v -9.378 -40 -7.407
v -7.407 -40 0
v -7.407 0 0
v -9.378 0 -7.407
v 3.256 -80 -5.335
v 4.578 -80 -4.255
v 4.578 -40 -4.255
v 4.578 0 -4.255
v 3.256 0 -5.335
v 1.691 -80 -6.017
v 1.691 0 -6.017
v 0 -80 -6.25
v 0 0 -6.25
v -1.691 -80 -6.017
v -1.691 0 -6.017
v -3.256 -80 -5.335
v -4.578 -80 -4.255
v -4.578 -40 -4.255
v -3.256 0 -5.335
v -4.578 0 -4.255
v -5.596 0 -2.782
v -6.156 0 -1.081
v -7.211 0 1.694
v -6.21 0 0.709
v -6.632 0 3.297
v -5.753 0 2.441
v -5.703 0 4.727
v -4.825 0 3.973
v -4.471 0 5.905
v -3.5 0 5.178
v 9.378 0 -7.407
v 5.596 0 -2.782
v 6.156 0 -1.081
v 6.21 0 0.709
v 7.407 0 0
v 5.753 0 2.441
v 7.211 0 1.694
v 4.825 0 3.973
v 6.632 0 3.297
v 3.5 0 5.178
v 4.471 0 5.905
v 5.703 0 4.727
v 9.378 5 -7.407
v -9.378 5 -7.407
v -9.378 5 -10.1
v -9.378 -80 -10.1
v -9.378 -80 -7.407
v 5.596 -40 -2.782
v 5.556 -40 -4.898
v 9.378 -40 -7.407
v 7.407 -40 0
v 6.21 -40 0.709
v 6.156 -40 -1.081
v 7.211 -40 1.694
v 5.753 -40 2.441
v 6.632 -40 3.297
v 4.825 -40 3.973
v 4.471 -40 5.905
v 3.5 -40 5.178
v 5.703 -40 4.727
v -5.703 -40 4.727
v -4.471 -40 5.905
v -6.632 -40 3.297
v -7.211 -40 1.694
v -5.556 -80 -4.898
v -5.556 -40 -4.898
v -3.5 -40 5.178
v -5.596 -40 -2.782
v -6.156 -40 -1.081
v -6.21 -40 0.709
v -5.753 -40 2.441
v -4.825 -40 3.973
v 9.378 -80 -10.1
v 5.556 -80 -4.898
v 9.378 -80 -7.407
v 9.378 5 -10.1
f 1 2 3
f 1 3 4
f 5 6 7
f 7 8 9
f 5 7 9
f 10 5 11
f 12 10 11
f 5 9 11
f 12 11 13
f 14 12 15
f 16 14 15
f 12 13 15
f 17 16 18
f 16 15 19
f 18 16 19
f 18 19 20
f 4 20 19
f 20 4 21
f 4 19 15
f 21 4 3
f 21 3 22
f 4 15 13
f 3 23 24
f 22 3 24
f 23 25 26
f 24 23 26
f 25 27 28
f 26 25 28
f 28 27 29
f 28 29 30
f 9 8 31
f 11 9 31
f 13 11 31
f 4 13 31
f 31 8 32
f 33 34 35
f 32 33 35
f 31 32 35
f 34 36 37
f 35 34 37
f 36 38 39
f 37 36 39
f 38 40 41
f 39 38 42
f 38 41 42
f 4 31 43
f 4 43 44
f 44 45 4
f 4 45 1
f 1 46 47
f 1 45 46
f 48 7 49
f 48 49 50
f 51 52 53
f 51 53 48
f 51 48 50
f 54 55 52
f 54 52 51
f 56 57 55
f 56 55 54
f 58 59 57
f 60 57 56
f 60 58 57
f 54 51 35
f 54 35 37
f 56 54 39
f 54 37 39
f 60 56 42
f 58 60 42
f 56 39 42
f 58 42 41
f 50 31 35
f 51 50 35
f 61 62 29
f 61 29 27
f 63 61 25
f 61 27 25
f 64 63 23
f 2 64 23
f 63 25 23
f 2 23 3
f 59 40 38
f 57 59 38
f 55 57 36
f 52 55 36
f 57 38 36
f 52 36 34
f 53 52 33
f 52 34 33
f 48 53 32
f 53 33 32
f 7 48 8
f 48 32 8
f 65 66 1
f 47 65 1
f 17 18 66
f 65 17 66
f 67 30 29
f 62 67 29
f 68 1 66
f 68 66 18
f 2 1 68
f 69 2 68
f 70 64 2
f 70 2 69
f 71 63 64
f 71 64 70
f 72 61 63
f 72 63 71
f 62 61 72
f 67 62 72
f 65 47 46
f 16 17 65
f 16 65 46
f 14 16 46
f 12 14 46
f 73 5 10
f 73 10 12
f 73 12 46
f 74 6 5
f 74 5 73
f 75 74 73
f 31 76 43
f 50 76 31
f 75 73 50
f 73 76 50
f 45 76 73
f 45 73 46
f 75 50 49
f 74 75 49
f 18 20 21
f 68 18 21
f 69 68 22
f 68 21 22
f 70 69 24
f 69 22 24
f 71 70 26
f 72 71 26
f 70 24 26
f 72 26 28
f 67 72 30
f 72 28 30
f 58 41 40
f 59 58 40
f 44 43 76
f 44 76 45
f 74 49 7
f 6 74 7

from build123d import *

# Parameters (mm, degrees)
F0_W     = 9.3780029565
F0_H     = 2.6930641449
F1_DEPTH = 80
F2_DEPTH = 40
F3_W     = 18.756005913
F3_H     = 2.6930641449
F4_DEPTH = 5


with BuildPart() as f1:
    # F0 (on Front) → F1 (new body)
    with BuildSketch(Plane.XZ):
        with BuildLine():
            ThreePointArc((4.5775509482, -4.2554115332), (0, -6.25), (-4.5775509482, -4.2554115332))
            Line((-4.5775509482, -4.2554115332), (-5.5563090648, -4.8979718597))
            ThreePointArc((-5.5563090648, -4.8979718597), (-3.0482564998, -6.7506170883), (0, -7.4069358551))
            ThreePointArc((0, -7.4069358551), (3.0482564998, -6.7506170883), (5.5563090648, -4.8979718597))
            Line((5.5563090648, -4.8979718597), (4.5775509482, -4.2554115332))
        make_face()
        with BuildLine():
            Line((9.3780029565, -7.4069358551), (5.5563090648, -4.8979718597))
            ThreePointArc((5.5563090648, -4.8979718597), (3.0482564998, -6.7506170883), (0, -7.4069358551))
            Line((0, -7.4069358551), (9.3780029565, -7.4069358551))
        make_face()
        with BuildLine():
            ThreePointArc((0, -7.4069358551), (-3.0482564998, -6.7506170883), (-5.5563090648, -4.8979718597))
            Line((-5.5563090648, -4.8979718597), (-9.3780029565, -7.4069358551))
            Line((-9.3780029565, -7.4069358551), (0, -7.4069358551))
        make_face()
        with Locations((-4.6890014783, -8.7534679275)):
            Rectangle(F0_W, F0_H)
        with Locations((4.6890014783, -8.7534679275)):
            Rectangle(F0_W, F0_H)
    extrude(amount=F1_DEPTH)

    # F0 (on Front) → F2 (join)
    with BuildSketch(Plane.XZ):
        with BuildLine():
            Line((-9.3780029565, -7.4069358551), (-5.5563090648, -4.8979718597))
            ThreePointArc((-5.5563090648, -4.8979718597), (-6.9288499621, -2.6179642785), (-7.4069358551, 0))
            Line((-7.4069358551, 0), (-9.3780029565, -7.4069358551))
        make_face()
        with BuildLine():
            ThreePointArc((-4.5775509482, -4.2554115332), (-6.2096209441, 0.7093008742), (-3.5, 5.1780787943))
            Line((-3.5, 5.1780787943), (-4.4709416805, 5.9053686803))
            ThreePointArc((-4.4709416805, 5.9053686803), (-6.6324458912, 3.2974778636), (-7.4069358551, 0))
            ThreePointArc((-7.4069358551, 0), (-6.9288499621, -2.6179642785), (-5.5563090648, -4.8979718597))
            Line((-5.5563090648, -4.8979718597), (-4.5775509482, -4.2554115332))
        make_face()
        with BuildLine():
            ThreePointArc((3.5, 5.1780787943), (6.2096209441, 0.7093008742), (4.5775509482, -4.2554115332))
            Line((4.5775509482, -4.2554115332), (5.5563090648, -4.8979718597))
            ThreePointArc((5.5563090648, -4.8979718597), (6.9288499621, -2.6179642785), (7.4069358551, 0))
            ThreePointArc((7.4069358551, 0), (6.6324458912, 3.2974778636), (4.4709416805, 5.9053686803))
            Line((4.4709416805, 5.9053686803), (3.5, 5.1780787943))
        make_face()
        with BuildLine():
            ThreePointArc((7.4069358551, 0), (6.9288499621, -2.6179642785), (5.5563090648, -4.8979718597))
            Line((5.5563090648, -4.8979718597), (9.3780029565, -7.4069358551))
            Line((9.3780029565, -7.4069358551), (7.4069358551, 0))
        make_face()
    extrude(amount=F2_DEPTH)

    # F3 (on face) → F4 (join)
    with BuildSketch(Plane(origin=(0, 0, 0), x_dir=(-1, 0, 0), z_dir=(0, 1, 0))):
        with Locations((0, -8.7534679275)):
            Rectangle(F3_W, F3_H)
    extrude(amount=F4_DEPTH)


solid = f1.part
